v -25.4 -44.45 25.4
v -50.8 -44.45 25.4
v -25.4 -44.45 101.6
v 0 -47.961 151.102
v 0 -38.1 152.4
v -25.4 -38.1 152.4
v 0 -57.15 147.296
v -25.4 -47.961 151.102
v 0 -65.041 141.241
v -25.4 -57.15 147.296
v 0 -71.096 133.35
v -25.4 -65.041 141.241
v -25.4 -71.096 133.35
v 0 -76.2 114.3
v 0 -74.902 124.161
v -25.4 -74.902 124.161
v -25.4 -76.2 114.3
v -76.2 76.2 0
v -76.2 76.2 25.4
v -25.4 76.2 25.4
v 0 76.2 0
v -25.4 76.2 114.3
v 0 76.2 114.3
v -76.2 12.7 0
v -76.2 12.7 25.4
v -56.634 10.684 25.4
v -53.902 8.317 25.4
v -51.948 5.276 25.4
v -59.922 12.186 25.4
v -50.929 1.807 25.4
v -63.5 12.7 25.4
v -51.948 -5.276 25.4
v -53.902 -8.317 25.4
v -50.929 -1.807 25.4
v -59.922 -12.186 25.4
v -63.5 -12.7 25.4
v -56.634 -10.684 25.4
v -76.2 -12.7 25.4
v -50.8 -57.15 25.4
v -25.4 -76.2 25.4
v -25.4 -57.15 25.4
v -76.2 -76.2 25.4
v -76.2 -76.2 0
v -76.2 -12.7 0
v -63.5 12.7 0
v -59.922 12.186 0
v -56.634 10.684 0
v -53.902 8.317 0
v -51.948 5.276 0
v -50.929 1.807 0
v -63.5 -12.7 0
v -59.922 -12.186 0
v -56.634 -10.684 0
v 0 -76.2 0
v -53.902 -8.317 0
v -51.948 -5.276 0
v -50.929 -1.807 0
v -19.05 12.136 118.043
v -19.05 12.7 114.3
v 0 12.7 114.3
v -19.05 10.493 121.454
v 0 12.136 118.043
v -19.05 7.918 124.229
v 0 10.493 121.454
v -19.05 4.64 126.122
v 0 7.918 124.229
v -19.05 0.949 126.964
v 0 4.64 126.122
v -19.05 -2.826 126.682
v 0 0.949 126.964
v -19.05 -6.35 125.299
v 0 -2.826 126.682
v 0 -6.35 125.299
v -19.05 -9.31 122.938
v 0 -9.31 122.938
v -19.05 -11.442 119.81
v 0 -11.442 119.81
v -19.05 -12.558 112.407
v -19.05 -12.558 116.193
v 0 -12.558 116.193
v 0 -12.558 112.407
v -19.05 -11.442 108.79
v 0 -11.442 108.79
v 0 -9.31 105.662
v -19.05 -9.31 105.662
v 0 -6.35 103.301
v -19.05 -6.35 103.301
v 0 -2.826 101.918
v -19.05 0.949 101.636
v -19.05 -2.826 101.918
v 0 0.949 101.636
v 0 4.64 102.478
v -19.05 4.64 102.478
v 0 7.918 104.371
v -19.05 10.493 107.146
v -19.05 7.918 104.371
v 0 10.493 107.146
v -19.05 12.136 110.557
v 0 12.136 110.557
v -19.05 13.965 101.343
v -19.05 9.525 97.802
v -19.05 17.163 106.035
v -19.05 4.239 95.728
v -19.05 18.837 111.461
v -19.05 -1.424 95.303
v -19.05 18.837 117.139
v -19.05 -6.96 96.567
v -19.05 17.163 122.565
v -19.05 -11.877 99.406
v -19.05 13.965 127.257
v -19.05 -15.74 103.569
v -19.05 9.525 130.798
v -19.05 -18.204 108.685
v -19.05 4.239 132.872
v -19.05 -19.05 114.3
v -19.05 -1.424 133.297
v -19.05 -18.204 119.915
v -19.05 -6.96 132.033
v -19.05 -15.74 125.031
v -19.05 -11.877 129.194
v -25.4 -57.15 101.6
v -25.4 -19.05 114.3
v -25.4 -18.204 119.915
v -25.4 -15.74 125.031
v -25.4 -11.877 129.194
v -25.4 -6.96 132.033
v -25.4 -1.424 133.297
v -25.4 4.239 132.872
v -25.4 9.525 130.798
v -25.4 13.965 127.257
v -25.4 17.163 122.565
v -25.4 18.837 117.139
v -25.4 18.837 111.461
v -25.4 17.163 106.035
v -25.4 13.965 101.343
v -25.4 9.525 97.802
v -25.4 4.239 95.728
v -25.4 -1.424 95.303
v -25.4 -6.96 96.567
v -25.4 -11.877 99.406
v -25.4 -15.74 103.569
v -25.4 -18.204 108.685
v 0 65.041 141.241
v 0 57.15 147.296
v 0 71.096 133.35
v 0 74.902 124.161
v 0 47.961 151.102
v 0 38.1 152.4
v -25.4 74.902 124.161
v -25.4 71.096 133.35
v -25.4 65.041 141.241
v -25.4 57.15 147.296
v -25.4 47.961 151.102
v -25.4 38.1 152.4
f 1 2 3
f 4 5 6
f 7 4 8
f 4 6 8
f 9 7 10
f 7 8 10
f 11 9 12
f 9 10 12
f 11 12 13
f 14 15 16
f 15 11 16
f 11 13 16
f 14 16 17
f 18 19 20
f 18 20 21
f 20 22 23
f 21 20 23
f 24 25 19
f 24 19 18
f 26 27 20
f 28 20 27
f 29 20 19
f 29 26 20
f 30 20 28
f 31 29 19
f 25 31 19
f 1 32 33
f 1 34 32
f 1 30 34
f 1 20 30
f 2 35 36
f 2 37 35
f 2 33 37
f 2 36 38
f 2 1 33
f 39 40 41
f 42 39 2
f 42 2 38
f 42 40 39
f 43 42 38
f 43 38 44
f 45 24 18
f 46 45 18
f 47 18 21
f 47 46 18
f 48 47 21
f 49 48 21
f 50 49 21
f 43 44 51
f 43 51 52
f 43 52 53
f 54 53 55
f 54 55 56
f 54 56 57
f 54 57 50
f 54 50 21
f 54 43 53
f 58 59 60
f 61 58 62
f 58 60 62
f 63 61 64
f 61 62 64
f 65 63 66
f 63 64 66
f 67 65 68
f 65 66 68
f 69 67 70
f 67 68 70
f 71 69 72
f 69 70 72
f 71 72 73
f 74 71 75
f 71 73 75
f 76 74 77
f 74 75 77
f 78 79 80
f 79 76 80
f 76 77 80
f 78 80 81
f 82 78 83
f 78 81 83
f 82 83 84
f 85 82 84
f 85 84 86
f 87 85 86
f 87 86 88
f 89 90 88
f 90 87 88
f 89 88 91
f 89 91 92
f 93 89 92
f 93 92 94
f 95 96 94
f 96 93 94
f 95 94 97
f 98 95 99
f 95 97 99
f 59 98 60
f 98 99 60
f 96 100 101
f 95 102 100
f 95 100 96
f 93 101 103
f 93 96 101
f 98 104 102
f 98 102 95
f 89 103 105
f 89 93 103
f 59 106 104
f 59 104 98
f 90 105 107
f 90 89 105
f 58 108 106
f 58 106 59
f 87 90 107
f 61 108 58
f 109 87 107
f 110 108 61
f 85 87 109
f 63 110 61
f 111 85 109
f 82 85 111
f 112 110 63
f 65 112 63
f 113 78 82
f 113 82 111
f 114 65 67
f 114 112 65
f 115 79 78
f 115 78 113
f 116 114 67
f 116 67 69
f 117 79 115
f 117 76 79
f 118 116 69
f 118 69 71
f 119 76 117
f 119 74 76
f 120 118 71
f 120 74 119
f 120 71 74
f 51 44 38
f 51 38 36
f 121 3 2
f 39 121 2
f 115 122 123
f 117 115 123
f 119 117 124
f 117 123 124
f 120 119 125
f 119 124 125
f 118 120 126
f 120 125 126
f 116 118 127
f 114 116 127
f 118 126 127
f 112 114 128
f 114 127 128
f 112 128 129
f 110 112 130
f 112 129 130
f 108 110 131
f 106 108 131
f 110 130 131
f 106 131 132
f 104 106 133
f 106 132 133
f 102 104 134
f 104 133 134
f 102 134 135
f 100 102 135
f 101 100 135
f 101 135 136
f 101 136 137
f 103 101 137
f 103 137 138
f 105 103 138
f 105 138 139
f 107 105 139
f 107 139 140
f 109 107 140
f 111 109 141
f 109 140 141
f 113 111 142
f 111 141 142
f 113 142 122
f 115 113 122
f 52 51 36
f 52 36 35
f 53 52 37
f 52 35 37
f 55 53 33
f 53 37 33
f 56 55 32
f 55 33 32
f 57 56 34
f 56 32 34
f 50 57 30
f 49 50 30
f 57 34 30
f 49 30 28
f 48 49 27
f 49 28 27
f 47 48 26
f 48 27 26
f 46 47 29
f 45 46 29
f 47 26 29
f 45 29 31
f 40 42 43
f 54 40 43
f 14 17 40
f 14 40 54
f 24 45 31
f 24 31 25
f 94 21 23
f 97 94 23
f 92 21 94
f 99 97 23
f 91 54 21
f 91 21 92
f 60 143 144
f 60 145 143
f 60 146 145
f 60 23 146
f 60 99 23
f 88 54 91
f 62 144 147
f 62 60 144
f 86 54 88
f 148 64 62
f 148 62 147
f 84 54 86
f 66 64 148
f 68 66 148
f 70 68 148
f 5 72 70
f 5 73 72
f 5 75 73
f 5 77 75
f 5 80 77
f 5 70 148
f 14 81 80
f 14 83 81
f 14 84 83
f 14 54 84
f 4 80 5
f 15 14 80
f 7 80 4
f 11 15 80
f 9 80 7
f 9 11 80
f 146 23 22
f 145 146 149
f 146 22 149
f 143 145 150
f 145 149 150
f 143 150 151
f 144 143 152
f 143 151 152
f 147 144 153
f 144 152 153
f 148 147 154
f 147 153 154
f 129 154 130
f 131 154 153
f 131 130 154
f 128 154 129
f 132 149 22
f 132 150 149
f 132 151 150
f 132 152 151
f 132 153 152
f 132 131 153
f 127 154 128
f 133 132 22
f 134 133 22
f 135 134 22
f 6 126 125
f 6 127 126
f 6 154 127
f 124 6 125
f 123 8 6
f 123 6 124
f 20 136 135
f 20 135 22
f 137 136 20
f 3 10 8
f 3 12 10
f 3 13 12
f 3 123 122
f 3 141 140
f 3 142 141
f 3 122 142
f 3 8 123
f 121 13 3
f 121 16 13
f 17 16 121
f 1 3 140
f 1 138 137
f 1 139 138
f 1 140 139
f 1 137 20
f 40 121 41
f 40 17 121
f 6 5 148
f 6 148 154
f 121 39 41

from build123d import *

# Parameters (mm, degrees)
F1_DEPTH  = 76.2
F2_R      = 12.7
F3_DEPTH  = 76.201
F5_DEPTH  = 25.401
F7_DEPTH  = 25.401
F8_R      = 19.05
F8_R_2    = 12.7
F9_DEPTH  = 6.35
F12_DEPTH = 12.7


with BuildPart() as f1:
    # F0 (on Front) → F1 (new body, symmetric)
    with BuildSketch(Plane.XZ):
        Polygon((0, 0), (0, 152.4), (-25.4, 152.4), (-25.4, 25.4), (-76.2, 25.4), (-76.2, 0), align=None)
    extrude(amount=F1_DEPTH, both=True)

    # F2 (on face) → F3 (cut, through all)
    with BuildSketch(Plane.YZ):
        with Locations((0, 114.3)):
            Circle(F2_R)
    extrude(amount=-F3_DEPTH, mode=Mode.SUBTRACT)

    # F4 (on face) → F5 (cut, through all)
    with BuildSketch(Plane.XY.offset(25.4)):
        with BuildLine():
            Line((-76.2, 12.7), (-76.2, -12.7))
            Line((-76.2, -12.7), (-63.5, -12.7))
            ThreePointArc((-63.5, -12.7), (-50.8, 0), (-63.5, 12.7))
            Line((-63.5, 12.7), (-76.2, 12.7))
        make_face()
    extrude(amount=-F5_DEPTH, mode=Mode.SUBTRACT)

    # F6 (on face) → F7 (cut, through all)
    with BuildSketch(Plane(origin=(-25.4, 0, 0), x_dir=(0, -1, 0), z_dir=(-1, 0, 0))):
        with BuildLine():
            Line((-76.2, 152.4), (-76.2, 114.3))
            ThreePointArc((-76.2, 114.3), (-65.0407683632, 141.2407683632), (-38.1, 152.4))
            Line((-38.1, 152.4), (-76.2, 152.4))
        make_face()
        with BuildLine():
            ThreePointArc((38.1, 152.4), (65.0407683632, 141.2407683632), (76.2, 114.3))
            Line((76.2, 114.3), (76.2, 152.4))
            Line((76.2, 152.4), (38.1, 152.4))
        make_face()
    extrude(amount=-F7_DEPTH, mode=Mode.SUBTRACT)

    # F8 (on face) → F9 (cut)
    with BuildSketch(Plane(origin=(-25.4, 0, 0), x_dir=(0, -1, 0), z_dir=(-1, 0, 0))):
        with Locations((0, 114.3)):
            Circle(F8_R)
        with Locations((0, 114.3)):
            Circle(F8_R_2, mode=Mode.SUBTRACT)
    extrude(amount=-F9_DEPTH, mode=Mode.SUBTRACT)

    # F11 (on offset) → F12 (join)
    with BuildSketch(Plane.XZ.offset(44.45)):
        Polygon((-25.4, 101.6), (-50.8, 25.4), (-25.4, 25.4), align=None)
    extrude(amount=F12_DEPTH)


solid = f1.part
